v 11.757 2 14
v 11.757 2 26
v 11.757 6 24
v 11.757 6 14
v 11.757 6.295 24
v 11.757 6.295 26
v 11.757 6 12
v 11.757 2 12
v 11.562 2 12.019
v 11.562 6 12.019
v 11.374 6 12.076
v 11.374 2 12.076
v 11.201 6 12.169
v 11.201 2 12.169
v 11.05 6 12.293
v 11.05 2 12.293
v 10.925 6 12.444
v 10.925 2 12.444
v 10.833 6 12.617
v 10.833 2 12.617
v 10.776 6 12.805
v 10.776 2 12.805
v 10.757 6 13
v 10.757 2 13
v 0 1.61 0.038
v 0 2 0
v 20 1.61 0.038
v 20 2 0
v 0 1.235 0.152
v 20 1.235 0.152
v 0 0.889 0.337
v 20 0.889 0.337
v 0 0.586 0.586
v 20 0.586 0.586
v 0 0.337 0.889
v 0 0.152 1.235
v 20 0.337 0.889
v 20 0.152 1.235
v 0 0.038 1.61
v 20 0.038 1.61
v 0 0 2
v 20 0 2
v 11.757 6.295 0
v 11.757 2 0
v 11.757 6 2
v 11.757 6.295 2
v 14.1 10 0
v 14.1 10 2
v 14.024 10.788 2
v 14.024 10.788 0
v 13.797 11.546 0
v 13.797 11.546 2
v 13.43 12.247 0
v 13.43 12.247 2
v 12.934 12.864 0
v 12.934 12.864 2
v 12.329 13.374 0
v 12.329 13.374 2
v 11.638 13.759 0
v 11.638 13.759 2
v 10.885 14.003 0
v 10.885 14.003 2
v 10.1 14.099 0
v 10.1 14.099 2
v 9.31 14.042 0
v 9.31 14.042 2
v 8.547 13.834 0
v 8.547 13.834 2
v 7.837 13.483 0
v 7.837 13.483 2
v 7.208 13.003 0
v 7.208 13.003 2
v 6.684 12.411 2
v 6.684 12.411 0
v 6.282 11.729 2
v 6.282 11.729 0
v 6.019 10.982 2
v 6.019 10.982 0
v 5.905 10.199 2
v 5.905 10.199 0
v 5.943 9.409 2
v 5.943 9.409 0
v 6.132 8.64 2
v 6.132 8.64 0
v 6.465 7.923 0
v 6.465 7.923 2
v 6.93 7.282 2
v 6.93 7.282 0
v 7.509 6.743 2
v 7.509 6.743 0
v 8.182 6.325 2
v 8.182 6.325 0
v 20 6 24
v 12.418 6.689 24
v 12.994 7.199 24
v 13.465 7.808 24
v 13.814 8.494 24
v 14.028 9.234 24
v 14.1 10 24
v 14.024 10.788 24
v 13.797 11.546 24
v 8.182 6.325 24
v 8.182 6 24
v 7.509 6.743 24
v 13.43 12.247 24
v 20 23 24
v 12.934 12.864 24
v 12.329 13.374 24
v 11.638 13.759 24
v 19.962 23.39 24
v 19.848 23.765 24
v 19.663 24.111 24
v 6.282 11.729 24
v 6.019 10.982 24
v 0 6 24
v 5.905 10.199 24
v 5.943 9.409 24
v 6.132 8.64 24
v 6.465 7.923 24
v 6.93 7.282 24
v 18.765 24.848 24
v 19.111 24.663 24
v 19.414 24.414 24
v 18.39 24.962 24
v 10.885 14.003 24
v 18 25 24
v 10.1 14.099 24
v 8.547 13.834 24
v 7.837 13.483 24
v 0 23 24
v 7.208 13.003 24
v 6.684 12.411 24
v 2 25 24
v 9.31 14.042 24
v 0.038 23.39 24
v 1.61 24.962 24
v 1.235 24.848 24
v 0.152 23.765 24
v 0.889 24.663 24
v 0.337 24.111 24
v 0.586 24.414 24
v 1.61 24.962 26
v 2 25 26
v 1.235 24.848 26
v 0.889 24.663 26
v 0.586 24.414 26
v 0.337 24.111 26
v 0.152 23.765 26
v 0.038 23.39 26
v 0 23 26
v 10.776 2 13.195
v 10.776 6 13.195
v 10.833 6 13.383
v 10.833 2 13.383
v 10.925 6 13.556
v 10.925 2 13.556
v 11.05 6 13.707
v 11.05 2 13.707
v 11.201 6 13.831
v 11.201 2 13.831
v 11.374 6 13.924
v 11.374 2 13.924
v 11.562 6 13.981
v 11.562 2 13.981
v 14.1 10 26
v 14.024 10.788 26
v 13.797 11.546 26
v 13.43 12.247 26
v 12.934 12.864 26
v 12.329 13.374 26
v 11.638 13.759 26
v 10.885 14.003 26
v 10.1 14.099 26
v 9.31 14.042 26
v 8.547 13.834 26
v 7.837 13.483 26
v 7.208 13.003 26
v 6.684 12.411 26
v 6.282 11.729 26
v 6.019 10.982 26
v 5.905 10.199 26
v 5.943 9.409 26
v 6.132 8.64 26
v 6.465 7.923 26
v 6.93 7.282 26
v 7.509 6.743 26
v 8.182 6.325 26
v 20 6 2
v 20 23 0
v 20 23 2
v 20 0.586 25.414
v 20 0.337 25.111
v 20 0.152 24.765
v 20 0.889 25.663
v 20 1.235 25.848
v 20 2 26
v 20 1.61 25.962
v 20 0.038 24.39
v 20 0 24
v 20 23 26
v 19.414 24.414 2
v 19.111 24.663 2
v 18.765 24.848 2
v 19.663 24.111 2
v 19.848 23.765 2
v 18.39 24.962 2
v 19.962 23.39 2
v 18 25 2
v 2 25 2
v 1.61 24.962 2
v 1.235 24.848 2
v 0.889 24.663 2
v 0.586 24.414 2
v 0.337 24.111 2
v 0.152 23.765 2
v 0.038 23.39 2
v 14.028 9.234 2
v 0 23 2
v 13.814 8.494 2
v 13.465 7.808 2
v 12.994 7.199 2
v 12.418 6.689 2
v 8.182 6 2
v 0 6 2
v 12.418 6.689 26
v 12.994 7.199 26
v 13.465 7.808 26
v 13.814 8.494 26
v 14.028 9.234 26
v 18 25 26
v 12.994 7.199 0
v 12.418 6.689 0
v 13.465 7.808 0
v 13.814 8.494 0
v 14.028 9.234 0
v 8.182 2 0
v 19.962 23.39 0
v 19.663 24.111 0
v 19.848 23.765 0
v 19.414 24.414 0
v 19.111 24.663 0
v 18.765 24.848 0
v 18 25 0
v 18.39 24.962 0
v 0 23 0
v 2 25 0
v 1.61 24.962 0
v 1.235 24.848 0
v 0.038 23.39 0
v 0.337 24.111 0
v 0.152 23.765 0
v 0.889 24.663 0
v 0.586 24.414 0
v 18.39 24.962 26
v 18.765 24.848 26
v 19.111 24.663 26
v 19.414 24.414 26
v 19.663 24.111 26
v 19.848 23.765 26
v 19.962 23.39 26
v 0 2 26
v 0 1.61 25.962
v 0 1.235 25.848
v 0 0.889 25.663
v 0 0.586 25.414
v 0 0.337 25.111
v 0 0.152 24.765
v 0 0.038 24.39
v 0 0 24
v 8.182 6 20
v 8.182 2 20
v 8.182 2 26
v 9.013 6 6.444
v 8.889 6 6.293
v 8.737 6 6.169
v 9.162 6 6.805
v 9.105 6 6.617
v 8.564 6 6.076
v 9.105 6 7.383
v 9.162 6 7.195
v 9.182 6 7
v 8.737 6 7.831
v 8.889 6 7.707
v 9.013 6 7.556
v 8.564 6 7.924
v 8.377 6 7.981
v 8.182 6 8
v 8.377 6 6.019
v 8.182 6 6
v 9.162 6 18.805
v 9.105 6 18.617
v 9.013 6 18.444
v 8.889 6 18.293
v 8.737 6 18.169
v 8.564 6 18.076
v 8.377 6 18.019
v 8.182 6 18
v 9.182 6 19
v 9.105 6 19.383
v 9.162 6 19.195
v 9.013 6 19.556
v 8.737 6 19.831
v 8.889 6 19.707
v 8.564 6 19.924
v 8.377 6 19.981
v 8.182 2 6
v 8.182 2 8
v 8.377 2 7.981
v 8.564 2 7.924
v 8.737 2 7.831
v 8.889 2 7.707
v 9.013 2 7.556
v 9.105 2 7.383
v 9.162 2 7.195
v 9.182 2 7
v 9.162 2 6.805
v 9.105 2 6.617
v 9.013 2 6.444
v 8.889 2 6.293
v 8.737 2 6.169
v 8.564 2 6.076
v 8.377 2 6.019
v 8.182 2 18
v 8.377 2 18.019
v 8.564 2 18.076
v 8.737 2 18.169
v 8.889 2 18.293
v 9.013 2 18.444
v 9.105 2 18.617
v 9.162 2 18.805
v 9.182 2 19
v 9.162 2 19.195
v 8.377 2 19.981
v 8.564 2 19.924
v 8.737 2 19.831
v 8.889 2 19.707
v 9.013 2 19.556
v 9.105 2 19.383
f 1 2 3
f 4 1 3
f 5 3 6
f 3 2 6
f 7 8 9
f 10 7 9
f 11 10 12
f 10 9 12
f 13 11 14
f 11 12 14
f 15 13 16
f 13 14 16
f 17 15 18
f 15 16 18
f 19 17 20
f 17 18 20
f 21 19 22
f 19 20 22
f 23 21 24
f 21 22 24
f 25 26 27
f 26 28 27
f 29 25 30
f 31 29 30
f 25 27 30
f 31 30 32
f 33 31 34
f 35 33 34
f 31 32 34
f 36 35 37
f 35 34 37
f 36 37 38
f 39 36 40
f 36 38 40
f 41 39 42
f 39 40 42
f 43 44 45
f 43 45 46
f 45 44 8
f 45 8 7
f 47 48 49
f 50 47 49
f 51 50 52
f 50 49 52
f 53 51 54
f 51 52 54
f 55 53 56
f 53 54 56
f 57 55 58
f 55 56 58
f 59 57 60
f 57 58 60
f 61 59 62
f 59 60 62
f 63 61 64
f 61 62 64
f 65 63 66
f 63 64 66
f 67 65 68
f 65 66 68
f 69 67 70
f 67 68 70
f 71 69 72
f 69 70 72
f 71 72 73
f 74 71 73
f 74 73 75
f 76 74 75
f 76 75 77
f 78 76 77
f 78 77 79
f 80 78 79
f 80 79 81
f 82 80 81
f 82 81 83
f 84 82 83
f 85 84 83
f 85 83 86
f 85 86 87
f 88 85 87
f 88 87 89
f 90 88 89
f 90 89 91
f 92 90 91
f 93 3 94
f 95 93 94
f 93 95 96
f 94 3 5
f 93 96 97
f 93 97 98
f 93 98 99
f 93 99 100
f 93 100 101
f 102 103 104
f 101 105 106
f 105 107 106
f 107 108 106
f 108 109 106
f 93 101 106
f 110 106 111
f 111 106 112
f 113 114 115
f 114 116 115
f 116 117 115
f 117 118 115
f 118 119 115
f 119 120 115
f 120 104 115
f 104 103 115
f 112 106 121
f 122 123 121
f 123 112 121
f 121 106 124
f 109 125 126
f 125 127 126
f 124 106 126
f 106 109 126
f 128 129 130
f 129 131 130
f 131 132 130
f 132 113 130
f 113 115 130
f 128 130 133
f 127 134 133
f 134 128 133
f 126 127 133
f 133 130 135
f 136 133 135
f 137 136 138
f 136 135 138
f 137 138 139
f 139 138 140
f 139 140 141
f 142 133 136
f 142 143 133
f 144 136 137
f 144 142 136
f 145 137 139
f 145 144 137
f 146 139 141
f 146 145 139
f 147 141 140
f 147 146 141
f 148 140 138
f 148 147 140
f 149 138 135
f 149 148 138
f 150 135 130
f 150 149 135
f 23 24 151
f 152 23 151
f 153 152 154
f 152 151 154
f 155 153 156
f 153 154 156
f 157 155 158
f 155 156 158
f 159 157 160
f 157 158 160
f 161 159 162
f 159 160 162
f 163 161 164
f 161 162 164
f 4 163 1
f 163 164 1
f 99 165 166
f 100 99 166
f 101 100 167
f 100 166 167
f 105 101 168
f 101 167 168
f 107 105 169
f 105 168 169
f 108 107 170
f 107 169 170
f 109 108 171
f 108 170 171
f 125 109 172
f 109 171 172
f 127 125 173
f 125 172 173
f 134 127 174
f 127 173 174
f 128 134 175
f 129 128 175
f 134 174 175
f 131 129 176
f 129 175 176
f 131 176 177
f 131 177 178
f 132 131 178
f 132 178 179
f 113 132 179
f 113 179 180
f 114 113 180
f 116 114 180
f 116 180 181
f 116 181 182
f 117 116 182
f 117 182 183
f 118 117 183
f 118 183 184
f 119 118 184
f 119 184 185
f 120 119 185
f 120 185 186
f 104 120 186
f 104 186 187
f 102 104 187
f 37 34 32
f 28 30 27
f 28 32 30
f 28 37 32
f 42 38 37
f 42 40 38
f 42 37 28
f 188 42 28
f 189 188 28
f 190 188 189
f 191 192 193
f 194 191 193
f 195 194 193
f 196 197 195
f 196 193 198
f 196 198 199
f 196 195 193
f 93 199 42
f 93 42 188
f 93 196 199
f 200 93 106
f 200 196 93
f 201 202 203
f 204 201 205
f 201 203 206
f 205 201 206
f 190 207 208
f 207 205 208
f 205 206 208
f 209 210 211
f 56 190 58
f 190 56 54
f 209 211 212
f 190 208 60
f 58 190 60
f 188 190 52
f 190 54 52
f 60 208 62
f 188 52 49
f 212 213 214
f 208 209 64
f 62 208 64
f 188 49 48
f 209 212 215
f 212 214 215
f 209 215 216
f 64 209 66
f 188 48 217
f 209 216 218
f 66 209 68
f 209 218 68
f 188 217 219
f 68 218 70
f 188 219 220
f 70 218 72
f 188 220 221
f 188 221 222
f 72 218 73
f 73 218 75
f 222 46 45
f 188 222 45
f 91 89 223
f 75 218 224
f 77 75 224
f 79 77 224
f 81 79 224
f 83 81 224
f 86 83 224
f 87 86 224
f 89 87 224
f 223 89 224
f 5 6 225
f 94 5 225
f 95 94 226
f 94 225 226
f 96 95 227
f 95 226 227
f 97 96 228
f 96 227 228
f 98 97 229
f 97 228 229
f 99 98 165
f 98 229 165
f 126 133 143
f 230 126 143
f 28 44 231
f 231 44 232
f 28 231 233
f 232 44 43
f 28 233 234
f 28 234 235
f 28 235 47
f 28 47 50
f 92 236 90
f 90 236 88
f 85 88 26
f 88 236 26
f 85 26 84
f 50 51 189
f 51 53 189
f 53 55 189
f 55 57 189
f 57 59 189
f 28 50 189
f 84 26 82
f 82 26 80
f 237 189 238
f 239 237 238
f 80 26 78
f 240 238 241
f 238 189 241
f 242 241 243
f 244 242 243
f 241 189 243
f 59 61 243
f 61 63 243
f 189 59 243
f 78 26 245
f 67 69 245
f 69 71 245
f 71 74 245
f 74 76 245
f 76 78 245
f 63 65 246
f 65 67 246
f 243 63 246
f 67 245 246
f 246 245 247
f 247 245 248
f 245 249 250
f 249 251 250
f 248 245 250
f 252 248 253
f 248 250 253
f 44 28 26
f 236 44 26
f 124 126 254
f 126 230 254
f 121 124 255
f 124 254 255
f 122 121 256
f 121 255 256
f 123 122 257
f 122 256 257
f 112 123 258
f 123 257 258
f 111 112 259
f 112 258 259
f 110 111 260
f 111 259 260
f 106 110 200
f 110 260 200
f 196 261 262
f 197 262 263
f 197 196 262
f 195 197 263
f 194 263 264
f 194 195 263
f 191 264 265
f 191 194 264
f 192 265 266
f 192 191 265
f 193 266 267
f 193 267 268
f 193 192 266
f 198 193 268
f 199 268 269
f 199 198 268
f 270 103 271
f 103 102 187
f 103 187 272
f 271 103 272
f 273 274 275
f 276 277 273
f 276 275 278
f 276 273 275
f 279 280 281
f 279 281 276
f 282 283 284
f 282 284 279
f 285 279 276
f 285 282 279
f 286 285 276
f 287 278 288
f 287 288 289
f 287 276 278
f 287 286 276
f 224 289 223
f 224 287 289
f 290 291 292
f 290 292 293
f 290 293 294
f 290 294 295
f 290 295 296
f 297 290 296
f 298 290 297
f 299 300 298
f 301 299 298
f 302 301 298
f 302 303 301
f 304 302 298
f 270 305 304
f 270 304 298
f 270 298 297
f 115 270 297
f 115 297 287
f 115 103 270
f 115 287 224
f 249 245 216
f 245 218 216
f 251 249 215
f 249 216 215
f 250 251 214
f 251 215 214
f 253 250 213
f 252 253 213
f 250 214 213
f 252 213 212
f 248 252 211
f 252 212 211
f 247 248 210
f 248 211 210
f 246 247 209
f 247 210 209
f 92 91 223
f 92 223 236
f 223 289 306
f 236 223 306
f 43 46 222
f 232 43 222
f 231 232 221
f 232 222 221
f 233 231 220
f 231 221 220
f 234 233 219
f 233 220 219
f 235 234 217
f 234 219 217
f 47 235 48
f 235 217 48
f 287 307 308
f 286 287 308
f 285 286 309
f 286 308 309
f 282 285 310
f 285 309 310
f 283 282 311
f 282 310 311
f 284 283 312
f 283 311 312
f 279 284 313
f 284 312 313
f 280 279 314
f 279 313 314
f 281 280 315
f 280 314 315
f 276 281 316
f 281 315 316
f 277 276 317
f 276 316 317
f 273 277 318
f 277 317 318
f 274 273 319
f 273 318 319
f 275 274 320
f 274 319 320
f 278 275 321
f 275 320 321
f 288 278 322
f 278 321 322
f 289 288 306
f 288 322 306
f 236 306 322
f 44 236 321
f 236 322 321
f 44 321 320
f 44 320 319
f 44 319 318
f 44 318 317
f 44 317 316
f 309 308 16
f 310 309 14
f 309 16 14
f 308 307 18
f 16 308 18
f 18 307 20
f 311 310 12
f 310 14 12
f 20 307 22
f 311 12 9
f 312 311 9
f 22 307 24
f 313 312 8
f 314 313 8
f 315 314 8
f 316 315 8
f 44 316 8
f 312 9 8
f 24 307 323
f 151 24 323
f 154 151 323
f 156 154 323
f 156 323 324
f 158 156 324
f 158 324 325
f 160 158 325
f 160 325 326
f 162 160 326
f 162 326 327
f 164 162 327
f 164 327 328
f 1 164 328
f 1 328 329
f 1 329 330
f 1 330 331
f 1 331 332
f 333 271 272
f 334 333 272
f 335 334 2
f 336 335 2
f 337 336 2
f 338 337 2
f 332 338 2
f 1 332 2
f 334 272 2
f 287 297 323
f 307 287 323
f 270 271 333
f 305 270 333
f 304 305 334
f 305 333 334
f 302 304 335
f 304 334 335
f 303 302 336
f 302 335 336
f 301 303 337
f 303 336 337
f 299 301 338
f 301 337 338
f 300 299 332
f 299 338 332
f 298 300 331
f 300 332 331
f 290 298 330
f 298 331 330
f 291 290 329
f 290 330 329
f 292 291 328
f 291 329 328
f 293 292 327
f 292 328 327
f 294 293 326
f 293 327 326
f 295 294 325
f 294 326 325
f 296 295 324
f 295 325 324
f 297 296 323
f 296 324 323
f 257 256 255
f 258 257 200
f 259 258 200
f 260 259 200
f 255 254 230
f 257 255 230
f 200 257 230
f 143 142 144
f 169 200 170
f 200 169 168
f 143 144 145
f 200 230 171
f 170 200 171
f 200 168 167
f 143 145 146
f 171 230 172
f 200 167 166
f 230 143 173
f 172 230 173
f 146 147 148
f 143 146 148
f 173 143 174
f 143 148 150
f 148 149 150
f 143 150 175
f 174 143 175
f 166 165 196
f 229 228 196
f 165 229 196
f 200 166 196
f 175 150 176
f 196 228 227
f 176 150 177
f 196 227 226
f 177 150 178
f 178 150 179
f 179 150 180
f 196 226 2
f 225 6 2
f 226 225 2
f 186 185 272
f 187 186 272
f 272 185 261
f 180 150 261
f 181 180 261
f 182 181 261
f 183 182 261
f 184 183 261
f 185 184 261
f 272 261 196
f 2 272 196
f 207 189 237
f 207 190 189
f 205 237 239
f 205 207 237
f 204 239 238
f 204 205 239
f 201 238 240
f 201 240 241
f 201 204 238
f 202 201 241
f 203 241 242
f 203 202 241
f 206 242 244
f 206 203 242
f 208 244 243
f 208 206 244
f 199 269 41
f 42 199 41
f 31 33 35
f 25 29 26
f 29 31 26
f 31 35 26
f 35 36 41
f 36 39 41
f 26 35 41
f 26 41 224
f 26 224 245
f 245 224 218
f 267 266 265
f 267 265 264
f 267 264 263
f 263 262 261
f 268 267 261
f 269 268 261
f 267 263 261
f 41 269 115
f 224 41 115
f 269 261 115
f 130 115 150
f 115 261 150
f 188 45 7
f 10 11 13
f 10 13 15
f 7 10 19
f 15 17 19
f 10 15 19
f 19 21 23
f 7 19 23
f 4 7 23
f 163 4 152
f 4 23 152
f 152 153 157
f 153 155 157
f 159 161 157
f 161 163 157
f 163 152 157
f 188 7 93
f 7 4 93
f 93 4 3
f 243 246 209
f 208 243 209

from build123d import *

# Parameters (mm, degrees)
F0_W     = 4
F0_H     = 18
F1_DEPTH = 20
F3_DEPTH = 30
F5_DEPTH = 4
F6_R     = 1.99999


# Not quite as in the source:
# - a fillet or chamfer is up to 0.001 mm smaller than in the source, because OpenCascade refuses the exact size
# - a feature names something its author has since deleted; it is built from what else it names


with BuildPart() as f1:
    # F0 (on Right) → F1 (new body)
    with BuildSketch(Plane.YZ):
        Polygon((0, 26), (0, 0), (25, 0), (25, 2), (6, 2), (6, 4), (2, 4), (2, 22), (6, 22), (6, 24), (25, 24), (25, 26), align=None)
        with Locations((4, 13)):
            Rectangle(F0_W, F0_H)
    extrude(amount=F1_DEPTH)

    # F2 (on face) → F3 (cut)
    with BuildSketch(Plane.XY.offset(26)):
        with BuildLine():
            ThreePointArc((11.7568019778, 6.295455924), (9.9657604027, 5.900142972), (8.1815710291, 6.3253141525))
            Line((8.1815710291, 6.3253141525), (8.1815710291, 2))
            Line((8.1815710291, 2), (10, 2))
            Line((10, 2), (11.7568019778, 2))
            Line((11.7568019778, 2), (11.7568019778, 6.295455924))
        make_face()
        with BuildLine():
            ThreePointArc((11.7568019778, 6.295455924), (13.4650316094, 7.8082983904), (14.1, 10))
            ThreePointArc((14.1, 10), (7.8373117169, 13.4832139455), (8.1815710291, 6.3253141525))
            ThreePointArc((8.1815710291, 6.3253141525), (9.9657604027, 5.900142972), (11.7568019778, 6.295455924))
        make_face()
    extrude(amount=-F3_DEPTH, mode=Mode.SUBTRACT)

    # F4 (on face) → F5 (join)
    with BuildSketch(Plane(origin=(0, 2, 0), x_dir=(-1, 0, 0), z_dir=(0, 1, 0))):
        with BuildLine():
            ThreePointArc((-11.7568019778, 12), (-11.0496951966, 12.2928932188), (-10.7568019778, 13))
            ThreePointArc((-10.7568019778, 13), (-11.0496951966, 13.7071067812), (-11.7568019778, 14))
            Line((-11.7568019778, 14), (-11.7568019778, 12))
        make_face()
        with BuildLine():
            Line((-8.1815710291, 18), (-8.1815710291, 20))
            ThreePointArc((-8.1815710291, 20), (-9.1815710291, 19), (-8.1815710291, 18))
        make_face()
        with BuildLine():
            ThreePointArc((-7.1815710291, 19), (-7.4744642479, 19.7071067812), (-8.1815710291, 20))
            Line((-8.1815710291, 20), (-8.1815710291, 18))
            ThreePointArc((-8.1815710291, 18), (-7.4744642479, 18.2928932188), (-7.1815710291, 19))
        make_face()
        with BuildLine():
            ThreePointArc((-8.1815710291, 8), (-9.1815710291, 7), (-8.1815710291, 6))
            Line((-8.1815710291, 6), (-8.1815710291, 8))
        make_face()
    extrude(amount=F5_DEPTH)

    # F6 (radius 2 in the source; OpenCascade refuses exactly that, so slightly less here)
    f6_edges = [f1.edges().sort_by_distance(p)[0] for p in [
        (10, 0, 26),
        (10, 0, 0),
        (20, 25, 1),
        (0, 25, 1),
        (0, 25, 25),
        (20, 25, 25),
    ]]
    fillet(f6_edges, radius=F6_R)


solid = f1.part
